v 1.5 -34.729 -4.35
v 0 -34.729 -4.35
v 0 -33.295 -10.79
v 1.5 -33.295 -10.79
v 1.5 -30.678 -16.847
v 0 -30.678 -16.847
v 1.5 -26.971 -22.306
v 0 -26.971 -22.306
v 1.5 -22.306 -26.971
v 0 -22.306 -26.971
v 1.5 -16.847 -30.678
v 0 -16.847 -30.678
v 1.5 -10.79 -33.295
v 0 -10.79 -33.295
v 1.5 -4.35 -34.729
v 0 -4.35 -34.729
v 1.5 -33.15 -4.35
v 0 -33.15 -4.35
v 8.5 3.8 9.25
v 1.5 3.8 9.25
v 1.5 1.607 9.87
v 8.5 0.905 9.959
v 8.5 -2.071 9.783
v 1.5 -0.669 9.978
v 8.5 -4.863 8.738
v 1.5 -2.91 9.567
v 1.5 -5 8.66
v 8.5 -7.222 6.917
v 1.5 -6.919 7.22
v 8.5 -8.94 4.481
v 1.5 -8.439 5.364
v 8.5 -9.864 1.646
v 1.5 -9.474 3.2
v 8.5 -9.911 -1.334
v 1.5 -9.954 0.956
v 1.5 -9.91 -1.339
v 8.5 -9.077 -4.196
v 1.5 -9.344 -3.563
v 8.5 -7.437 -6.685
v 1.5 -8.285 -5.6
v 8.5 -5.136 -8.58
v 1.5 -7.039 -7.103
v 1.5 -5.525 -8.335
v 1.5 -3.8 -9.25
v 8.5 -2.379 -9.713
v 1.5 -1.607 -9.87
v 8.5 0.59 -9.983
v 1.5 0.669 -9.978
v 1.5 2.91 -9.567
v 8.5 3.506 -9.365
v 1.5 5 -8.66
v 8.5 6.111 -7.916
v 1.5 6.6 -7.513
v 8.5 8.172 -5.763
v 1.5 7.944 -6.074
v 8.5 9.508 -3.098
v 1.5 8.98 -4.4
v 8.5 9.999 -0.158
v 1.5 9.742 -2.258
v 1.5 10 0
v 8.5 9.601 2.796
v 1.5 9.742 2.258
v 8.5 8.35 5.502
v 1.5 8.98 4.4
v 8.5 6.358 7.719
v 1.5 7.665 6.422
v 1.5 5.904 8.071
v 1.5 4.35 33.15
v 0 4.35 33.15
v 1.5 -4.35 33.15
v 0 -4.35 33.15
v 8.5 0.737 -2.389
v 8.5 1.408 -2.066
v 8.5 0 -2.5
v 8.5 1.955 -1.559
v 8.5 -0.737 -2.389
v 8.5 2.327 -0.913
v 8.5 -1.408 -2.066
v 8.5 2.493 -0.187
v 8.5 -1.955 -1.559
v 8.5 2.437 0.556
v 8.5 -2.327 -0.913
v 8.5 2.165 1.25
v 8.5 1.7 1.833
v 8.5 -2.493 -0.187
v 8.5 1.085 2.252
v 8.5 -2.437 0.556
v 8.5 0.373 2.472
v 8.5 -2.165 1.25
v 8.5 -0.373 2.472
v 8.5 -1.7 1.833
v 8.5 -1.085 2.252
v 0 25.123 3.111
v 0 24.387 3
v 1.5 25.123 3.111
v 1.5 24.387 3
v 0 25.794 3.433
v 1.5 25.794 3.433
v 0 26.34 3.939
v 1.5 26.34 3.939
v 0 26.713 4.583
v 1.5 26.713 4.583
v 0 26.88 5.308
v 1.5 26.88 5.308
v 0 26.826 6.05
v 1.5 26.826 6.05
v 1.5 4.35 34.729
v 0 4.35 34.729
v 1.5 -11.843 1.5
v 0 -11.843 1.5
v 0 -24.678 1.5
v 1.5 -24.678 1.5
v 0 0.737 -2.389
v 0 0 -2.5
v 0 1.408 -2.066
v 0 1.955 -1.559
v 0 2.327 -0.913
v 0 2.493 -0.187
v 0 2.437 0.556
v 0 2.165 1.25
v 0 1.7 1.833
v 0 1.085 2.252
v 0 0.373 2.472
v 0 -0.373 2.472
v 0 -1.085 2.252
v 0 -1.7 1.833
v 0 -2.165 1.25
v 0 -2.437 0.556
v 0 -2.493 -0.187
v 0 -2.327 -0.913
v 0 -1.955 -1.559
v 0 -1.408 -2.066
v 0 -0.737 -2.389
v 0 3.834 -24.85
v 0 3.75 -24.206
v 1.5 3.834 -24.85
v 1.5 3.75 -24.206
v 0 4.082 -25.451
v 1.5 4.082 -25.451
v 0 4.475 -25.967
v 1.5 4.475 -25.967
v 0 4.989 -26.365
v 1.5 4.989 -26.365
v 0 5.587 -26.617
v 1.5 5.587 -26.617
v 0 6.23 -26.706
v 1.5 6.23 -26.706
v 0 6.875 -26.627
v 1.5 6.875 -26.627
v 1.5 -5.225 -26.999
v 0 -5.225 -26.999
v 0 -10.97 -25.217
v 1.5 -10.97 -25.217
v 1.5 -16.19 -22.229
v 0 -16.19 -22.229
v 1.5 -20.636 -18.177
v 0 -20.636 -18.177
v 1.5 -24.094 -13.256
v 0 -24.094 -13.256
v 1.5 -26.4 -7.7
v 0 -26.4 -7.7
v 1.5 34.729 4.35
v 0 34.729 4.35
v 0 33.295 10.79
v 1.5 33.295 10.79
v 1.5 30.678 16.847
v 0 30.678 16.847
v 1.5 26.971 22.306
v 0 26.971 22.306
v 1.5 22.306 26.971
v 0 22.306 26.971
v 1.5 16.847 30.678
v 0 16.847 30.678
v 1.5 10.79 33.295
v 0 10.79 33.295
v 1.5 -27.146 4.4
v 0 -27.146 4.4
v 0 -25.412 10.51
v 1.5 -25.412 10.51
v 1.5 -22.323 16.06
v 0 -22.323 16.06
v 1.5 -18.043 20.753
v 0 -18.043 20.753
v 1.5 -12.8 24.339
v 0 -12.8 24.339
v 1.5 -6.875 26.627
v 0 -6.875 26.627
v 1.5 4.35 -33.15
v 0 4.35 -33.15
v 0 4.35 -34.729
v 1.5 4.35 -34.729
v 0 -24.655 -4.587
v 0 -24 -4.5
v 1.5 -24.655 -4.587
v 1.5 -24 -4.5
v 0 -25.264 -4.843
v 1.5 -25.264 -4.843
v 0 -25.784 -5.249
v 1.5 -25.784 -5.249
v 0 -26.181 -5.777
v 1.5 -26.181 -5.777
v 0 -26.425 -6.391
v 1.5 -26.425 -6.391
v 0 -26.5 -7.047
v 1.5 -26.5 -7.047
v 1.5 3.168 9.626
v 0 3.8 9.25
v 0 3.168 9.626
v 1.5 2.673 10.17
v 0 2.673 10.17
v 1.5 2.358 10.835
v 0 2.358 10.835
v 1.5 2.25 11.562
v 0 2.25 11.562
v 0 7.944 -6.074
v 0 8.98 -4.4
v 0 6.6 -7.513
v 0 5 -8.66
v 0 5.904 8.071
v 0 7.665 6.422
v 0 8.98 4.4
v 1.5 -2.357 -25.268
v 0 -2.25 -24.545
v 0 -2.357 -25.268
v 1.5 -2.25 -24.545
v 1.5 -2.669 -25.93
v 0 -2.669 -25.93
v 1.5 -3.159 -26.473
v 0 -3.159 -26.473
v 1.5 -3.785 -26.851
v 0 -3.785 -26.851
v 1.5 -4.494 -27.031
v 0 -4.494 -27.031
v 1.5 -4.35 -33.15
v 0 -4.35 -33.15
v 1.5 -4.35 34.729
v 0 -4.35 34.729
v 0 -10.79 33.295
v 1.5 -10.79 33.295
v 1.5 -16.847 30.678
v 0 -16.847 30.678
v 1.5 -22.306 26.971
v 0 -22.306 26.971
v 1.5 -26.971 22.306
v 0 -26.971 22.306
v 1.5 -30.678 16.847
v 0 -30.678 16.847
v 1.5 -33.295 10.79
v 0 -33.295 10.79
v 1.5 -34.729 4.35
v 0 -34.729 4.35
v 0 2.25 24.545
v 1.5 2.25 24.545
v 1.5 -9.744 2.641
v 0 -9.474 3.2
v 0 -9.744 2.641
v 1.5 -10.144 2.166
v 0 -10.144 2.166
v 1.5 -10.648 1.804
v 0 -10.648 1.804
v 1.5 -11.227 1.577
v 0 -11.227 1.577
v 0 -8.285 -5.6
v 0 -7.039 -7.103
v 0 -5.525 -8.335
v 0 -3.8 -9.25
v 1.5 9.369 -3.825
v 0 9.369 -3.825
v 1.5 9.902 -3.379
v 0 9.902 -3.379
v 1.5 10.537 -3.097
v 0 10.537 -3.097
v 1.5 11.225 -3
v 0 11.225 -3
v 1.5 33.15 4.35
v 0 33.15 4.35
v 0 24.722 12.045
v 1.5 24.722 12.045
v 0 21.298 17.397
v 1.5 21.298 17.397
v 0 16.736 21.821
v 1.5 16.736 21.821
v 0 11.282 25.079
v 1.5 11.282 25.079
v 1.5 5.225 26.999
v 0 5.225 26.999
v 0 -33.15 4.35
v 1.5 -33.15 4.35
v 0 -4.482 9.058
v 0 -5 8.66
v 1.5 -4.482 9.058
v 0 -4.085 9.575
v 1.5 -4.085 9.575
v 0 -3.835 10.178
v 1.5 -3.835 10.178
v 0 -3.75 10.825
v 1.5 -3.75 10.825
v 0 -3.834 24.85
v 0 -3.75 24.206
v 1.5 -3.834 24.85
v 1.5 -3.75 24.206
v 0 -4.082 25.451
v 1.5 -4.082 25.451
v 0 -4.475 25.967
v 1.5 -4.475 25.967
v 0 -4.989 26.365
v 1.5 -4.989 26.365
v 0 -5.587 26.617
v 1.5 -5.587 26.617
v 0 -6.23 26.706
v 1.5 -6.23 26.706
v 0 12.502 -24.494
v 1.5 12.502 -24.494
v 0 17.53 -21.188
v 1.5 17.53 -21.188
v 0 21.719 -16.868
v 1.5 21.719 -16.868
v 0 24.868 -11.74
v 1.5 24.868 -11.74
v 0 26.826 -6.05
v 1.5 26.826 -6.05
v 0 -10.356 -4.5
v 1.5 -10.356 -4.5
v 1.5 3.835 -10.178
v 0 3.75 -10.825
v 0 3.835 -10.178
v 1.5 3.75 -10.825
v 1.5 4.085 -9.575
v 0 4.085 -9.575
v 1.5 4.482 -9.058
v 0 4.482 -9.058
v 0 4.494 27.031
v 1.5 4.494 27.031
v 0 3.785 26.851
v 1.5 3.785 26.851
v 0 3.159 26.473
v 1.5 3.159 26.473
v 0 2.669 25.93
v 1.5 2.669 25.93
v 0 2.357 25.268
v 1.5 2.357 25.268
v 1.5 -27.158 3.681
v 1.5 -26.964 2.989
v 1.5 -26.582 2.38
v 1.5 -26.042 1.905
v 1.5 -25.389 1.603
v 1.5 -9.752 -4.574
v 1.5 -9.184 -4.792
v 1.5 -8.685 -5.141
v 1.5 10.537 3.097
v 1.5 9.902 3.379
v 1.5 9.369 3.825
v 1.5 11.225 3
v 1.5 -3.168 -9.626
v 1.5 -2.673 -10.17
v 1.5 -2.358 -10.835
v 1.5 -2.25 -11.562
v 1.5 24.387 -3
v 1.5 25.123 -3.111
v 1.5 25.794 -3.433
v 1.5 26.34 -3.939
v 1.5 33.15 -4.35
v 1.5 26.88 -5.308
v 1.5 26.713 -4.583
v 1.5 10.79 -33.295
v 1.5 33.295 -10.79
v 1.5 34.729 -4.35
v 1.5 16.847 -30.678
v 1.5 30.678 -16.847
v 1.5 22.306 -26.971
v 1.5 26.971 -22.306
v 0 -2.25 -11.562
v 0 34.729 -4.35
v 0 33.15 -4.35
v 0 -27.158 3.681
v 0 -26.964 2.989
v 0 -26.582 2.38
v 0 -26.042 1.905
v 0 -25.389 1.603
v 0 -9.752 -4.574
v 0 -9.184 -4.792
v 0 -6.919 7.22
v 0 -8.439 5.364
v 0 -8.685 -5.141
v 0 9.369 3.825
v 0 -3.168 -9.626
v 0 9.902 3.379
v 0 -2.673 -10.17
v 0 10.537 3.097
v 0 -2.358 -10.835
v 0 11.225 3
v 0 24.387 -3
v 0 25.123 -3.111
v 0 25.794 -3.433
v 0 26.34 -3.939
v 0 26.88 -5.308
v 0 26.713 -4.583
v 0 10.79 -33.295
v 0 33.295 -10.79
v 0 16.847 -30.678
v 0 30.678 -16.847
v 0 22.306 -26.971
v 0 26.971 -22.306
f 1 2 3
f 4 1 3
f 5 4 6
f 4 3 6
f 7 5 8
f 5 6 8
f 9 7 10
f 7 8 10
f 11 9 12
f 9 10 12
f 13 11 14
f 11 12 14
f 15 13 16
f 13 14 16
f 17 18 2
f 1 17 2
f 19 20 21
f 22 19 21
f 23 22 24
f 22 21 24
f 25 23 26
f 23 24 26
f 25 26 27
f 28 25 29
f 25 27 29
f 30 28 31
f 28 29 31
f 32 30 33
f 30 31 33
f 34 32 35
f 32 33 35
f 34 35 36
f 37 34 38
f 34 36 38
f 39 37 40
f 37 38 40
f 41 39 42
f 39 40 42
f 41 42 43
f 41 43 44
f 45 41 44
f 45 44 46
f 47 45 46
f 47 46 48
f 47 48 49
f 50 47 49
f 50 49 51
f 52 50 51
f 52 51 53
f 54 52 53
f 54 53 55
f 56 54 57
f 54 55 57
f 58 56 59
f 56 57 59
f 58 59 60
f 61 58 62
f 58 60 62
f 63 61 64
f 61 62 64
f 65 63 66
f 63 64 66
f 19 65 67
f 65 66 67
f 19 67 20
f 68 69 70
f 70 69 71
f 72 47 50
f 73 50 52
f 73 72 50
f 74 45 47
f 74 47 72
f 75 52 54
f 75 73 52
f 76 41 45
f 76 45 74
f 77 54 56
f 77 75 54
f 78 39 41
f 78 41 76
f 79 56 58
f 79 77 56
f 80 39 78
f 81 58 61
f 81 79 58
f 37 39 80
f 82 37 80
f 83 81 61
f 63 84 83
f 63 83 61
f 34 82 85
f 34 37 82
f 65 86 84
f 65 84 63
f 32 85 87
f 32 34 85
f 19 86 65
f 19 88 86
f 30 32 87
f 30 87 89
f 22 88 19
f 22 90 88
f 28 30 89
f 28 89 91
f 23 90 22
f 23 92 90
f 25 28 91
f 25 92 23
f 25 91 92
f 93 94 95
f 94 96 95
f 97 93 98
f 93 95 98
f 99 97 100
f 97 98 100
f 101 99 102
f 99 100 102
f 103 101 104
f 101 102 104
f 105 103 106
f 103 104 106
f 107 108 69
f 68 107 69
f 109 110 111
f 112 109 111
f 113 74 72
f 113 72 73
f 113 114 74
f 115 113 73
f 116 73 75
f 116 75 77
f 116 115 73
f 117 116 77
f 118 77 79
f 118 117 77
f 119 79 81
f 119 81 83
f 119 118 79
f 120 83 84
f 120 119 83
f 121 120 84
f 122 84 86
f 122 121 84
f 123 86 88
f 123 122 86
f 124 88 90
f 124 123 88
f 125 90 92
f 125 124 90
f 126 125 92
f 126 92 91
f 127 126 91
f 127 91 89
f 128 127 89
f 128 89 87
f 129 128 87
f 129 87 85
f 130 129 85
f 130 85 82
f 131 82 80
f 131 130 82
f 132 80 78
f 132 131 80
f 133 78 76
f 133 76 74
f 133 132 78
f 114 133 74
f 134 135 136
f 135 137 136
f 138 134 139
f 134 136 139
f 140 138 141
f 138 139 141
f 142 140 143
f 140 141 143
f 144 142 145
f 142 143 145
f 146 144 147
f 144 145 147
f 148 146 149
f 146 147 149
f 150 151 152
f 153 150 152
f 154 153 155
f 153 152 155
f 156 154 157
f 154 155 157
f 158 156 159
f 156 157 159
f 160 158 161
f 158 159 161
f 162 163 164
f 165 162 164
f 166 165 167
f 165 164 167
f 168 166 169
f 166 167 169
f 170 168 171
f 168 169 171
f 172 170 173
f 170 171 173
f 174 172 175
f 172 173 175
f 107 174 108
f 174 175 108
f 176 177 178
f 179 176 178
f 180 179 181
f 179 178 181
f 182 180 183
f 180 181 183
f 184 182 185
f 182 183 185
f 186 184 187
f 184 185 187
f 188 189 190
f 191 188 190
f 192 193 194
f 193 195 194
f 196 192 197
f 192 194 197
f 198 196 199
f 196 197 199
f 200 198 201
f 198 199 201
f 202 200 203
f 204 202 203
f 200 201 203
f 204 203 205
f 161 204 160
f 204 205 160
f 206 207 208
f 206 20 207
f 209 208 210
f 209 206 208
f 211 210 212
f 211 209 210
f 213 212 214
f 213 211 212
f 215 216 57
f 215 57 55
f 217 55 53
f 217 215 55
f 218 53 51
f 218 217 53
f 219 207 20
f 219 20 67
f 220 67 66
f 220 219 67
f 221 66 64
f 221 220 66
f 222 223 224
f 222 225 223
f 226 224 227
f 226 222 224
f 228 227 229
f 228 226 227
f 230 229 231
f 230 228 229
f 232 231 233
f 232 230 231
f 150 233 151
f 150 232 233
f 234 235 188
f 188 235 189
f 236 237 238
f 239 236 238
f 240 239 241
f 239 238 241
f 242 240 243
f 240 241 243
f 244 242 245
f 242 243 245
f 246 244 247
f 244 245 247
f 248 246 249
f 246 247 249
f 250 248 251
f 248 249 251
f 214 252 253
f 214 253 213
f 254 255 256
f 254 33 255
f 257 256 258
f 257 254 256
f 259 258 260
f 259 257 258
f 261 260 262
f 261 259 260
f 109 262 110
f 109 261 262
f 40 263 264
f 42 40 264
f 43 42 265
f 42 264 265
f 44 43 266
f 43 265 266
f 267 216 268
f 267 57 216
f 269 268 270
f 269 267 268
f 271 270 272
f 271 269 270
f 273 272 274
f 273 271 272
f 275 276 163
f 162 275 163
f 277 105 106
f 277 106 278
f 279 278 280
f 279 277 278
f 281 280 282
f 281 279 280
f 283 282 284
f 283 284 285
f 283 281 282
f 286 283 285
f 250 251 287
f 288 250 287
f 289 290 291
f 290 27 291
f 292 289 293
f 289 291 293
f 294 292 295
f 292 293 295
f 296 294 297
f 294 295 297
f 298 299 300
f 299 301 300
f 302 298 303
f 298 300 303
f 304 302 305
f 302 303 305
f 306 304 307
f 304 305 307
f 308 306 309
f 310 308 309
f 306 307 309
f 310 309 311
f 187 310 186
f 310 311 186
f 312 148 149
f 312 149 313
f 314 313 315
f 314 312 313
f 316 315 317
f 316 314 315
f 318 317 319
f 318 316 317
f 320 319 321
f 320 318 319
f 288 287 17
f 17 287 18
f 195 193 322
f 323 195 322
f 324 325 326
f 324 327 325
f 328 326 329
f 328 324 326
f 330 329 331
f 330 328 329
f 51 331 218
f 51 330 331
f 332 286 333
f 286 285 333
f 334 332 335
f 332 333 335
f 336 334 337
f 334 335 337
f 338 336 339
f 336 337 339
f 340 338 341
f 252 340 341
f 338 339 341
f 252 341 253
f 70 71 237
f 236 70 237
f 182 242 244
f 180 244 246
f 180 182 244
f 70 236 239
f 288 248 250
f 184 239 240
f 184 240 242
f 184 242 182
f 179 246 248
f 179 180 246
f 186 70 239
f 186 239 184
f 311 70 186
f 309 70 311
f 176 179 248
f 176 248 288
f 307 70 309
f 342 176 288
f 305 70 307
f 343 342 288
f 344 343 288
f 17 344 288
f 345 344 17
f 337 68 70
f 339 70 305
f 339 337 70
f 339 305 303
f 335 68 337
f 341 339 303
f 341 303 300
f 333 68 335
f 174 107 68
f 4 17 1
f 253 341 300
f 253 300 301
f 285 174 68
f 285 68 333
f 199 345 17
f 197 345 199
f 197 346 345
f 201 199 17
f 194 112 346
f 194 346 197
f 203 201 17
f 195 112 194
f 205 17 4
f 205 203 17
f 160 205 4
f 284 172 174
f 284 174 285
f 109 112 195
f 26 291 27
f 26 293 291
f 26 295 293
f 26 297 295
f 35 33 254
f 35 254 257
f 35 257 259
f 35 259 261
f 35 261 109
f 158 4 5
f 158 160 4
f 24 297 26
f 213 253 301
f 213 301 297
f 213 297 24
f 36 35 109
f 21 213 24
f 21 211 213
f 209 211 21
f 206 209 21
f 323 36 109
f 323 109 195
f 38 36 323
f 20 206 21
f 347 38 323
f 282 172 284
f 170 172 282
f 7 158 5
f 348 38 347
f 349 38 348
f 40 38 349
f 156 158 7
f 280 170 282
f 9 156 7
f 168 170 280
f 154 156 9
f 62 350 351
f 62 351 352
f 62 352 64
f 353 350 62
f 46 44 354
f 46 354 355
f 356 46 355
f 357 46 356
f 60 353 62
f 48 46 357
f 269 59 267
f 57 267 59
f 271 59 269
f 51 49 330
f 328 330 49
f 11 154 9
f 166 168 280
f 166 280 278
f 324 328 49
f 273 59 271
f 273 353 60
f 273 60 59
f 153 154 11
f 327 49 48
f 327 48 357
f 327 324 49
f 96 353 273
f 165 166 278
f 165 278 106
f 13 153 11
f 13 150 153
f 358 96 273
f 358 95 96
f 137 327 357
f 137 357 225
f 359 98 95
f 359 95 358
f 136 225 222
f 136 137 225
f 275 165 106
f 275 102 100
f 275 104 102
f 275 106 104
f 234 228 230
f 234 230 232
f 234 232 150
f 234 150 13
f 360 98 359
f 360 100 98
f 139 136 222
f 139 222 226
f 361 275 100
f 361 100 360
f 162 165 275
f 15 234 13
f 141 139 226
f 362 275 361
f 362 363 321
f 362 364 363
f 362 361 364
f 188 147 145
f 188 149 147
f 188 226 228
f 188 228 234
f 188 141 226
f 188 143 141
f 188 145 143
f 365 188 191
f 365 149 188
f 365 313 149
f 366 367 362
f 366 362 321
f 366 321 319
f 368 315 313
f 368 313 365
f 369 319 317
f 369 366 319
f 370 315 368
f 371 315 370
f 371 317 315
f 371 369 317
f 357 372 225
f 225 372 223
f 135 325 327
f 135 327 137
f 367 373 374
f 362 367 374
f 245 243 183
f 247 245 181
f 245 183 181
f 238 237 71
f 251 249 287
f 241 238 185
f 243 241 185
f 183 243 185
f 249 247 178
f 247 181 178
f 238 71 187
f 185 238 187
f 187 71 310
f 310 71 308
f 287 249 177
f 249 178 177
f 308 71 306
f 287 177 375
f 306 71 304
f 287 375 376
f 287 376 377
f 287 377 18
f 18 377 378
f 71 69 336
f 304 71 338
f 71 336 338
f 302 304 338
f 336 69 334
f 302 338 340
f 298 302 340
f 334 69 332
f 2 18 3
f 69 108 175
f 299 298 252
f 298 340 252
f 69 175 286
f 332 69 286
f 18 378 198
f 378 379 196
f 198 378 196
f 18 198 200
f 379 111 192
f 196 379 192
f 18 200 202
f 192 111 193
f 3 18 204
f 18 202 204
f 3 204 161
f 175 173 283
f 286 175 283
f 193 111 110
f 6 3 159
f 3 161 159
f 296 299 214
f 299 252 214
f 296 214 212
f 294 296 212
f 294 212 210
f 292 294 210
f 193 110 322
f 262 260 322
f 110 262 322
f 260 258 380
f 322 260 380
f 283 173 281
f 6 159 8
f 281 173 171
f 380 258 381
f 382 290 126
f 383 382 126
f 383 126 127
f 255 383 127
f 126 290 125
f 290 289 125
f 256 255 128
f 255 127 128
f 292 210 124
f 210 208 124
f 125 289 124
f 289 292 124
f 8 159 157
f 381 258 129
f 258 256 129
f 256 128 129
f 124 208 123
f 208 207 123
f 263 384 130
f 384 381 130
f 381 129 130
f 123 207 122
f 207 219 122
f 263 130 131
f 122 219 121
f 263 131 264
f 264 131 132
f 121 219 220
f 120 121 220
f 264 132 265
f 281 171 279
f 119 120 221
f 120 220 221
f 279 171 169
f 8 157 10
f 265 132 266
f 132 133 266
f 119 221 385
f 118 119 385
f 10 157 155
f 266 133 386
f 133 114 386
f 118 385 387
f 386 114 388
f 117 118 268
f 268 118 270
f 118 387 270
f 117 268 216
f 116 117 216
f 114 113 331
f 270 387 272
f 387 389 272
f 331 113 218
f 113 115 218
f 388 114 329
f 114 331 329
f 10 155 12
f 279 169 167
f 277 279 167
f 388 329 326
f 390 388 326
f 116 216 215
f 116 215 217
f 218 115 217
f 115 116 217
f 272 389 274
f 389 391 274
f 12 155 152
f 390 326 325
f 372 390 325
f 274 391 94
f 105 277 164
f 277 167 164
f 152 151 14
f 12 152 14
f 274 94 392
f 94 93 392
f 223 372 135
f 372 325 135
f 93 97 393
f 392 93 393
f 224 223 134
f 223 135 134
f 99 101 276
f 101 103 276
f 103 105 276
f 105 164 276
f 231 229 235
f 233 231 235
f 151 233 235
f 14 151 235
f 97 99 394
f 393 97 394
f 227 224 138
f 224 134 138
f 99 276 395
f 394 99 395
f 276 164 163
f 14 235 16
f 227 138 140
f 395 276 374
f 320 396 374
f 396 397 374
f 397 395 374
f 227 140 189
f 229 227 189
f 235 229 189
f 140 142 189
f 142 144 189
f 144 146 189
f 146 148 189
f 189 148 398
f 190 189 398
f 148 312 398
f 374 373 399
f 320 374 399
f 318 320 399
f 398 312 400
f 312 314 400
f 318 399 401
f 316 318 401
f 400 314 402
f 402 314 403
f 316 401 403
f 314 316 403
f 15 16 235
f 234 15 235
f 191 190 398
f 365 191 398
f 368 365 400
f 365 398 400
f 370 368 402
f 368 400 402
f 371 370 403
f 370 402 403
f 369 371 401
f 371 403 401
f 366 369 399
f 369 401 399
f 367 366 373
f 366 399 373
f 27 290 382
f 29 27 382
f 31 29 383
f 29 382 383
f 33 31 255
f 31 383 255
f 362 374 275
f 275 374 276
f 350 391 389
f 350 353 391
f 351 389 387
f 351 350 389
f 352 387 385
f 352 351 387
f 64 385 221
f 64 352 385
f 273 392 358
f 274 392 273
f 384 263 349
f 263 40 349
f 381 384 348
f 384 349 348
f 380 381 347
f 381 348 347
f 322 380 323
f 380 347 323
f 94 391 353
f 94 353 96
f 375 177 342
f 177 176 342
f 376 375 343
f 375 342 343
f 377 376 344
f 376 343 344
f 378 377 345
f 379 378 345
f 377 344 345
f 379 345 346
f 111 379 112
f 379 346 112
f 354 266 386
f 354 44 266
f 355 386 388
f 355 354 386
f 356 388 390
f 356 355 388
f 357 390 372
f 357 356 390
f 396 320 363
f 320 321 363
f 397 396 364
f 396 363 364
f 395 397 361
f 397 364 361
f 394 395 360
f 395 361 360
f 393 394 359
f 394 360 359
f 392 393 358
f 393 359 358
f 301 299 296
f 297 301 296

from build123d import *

# Parameters (mm, degrees)
SKETCH1_R           = 2.5
BOSS_EXTRUDE3_DEPTH = 1.5
FILLET1_R           = 2.5
SKETCH3_R           = 10
SKETCH3_R_2         = 2.5
BOSS_EXTRUDE4_DEPTH = 7


with BuildPart() as part:
    # Sketch1 → Boss-Extrude3 (new body)
    with BuildSketch(Plane(origin=(0, 0, 0), x_dir=(0, 0, -1), z_dir=(1, 0, 0))):
        with BuildLine():
            Line((-34.72862652, 4.35), (-33.15, 4.35))
            Line((-33.15, 4.35), (-33.15, -4.35))
            Line((-33.15, -4.35), (-34.72862652, -4.35))
            ThreePointArc((-34.72862652, -4.35), (-24.748737342, -24.748737342), (-4.35, -34.72862652))
            Line((-4.35, -34.72862652), (-4.35, -33.15))
            Line((-4.35, -33.15), (4.35, -33.15))
            Line((4.35, -33.15), (4.35, -34.72862652))
            ThreePointArc((4.35, -34.72862652), (24.748737342, -24.748737342), (34.72862652, -4.35))
            Line((34.72862652, -4.35), (33.15, -4.35))
            Line((33.15, -4.35), (33.15, 4.35))
            Line((33.15, 4.35), (34.72862652, 4.35))
            ThreePointArc((34.72862652, 4.35), (24.748737342, 24.748737342), (4.35, 34.72862652))
            Line((4.35, 34.72862652), (4.35, 33.15))
            Line((4.35, 33.15), (-4.35, 33.15))
            Line((-4.35, 33.15), (-4.35, 34.72862652))
            ThreePointArc((-4.35, 34.72862652), (-24.748737342, 24.748737342), (-34.72862652, 4.35))
        make_face()
        Circle(SKETCH1_R, mode=Mode.SUBTRACT)
        with BuildLine():
            Line((9.270248109, 3.75), (27.243118397, 3.75))
            ThreePointArc((27.243118397, 3.75), (19.17641557, 19.71078603), (3, 27.335873866))
            Line((3, 27.335873866), (3, 9.539392014))
            ThreePointArc((3, 9.539392014), (6.783731432, 7.347175502), (9.270248109, 3.75))
        make_face(mode=Mode.SUBTRACT)
        with BuildLine():
            Line((-3, 9.539392014), (-3, 27.335873866))
            ThreePointArc((-3, 27.335873866), (-19.709993452, 19.177230199), (-27.407799985, 2.25))
            Line((-27.407799985, 2.25), (-9.743587635, 2.25))
            ThreePointArc((-9.743587635, 2.25), (-7.340542585, 6.790908228), (-3, 9.539392014))
        make_face(mode=Mode.SUBTRACT)
        with BuildLine():
            Line((9.743587635, -2.25), (27.407799985, -2.25))
            ThreePointArc((27.407799985, -2.25), (20.230473673, -18.627343744), (4.5, -27.129319933))
            Line((4.5, -27.129319933), (4.5, -8.93028555))
            ThreePointArc((4.5, -8.93028555), (7.866161766, -6.174422974), (9.743587635, -2.25))
        make_face(mode=Mode.SUBTRACT)
        with BuildLine():
            Line((-1.5, -9.886859967), (-1.5, -27.459060435))
            ThreePointArc((-1.5, -27.459060435), (-18.629857769, -20.22815858), (-27.243118397, -3.75))
            Line((-27.243118397, -3.75), (-9.270248109, -3.75))
            ThreePointArc((-9.270248109, -3.75), (-6.197969316, -7.847622338), (-1.5, -9.886859967))
        make_face(mode=Mode.SUBTRACT)
    extrude(amount=BOSS_EXTRUDE3_DEPTH)

    # Fillet1
    fillet1_edges = [part.edges().sort_by_distance(p)[0] for p in [
        (0.75, -9.886859967, 1.5),
        (0.75, -3.75, 9.270248109),
        (0.75, -3.75, 27.243118397),
        (0.75, -27.459060435, 1.5),
        (0.75, 27.335873866, 3),
        (0.75, 2.25, 27.407799985),
        (0.75, 2.25, 9.743587635),
        (0.75, 9.539392014, 3),
        (0.75, 3.75, -27.243118397),
        (0.75, 27.335873866, -3),
        (0.75, 9.539392014, -3),
        (0.75, 3.75, -9.270248109),
        (0.75, -2.25, -9.743587635),
        (0.75, -8.93028555, -4.5),
        (0.75, -27.129319933, -4.5),
        (0.75, -2.25, -27.407799985),
    ]]
    fillet(fillet1_edges, radius=FILLET1_R)

    # Sketch3 → Boss-Extrude4 (add)
    with BuildSketch(Plane(origin=(1.5, 0, 0), x_dir=(0, 0, -1), z_dir=(1, 0, 0))):
        with Locations(Location((0, 0, 0), (0, 0, 157.666317342))):
            Circle(SKETCH3_R)
        Circle(SKETCH3_R_2, mode=Mode.SUBTRACT)
    extrude(amount=BOSS_EXTRUDE4_DEPTH)


solid = part.part
